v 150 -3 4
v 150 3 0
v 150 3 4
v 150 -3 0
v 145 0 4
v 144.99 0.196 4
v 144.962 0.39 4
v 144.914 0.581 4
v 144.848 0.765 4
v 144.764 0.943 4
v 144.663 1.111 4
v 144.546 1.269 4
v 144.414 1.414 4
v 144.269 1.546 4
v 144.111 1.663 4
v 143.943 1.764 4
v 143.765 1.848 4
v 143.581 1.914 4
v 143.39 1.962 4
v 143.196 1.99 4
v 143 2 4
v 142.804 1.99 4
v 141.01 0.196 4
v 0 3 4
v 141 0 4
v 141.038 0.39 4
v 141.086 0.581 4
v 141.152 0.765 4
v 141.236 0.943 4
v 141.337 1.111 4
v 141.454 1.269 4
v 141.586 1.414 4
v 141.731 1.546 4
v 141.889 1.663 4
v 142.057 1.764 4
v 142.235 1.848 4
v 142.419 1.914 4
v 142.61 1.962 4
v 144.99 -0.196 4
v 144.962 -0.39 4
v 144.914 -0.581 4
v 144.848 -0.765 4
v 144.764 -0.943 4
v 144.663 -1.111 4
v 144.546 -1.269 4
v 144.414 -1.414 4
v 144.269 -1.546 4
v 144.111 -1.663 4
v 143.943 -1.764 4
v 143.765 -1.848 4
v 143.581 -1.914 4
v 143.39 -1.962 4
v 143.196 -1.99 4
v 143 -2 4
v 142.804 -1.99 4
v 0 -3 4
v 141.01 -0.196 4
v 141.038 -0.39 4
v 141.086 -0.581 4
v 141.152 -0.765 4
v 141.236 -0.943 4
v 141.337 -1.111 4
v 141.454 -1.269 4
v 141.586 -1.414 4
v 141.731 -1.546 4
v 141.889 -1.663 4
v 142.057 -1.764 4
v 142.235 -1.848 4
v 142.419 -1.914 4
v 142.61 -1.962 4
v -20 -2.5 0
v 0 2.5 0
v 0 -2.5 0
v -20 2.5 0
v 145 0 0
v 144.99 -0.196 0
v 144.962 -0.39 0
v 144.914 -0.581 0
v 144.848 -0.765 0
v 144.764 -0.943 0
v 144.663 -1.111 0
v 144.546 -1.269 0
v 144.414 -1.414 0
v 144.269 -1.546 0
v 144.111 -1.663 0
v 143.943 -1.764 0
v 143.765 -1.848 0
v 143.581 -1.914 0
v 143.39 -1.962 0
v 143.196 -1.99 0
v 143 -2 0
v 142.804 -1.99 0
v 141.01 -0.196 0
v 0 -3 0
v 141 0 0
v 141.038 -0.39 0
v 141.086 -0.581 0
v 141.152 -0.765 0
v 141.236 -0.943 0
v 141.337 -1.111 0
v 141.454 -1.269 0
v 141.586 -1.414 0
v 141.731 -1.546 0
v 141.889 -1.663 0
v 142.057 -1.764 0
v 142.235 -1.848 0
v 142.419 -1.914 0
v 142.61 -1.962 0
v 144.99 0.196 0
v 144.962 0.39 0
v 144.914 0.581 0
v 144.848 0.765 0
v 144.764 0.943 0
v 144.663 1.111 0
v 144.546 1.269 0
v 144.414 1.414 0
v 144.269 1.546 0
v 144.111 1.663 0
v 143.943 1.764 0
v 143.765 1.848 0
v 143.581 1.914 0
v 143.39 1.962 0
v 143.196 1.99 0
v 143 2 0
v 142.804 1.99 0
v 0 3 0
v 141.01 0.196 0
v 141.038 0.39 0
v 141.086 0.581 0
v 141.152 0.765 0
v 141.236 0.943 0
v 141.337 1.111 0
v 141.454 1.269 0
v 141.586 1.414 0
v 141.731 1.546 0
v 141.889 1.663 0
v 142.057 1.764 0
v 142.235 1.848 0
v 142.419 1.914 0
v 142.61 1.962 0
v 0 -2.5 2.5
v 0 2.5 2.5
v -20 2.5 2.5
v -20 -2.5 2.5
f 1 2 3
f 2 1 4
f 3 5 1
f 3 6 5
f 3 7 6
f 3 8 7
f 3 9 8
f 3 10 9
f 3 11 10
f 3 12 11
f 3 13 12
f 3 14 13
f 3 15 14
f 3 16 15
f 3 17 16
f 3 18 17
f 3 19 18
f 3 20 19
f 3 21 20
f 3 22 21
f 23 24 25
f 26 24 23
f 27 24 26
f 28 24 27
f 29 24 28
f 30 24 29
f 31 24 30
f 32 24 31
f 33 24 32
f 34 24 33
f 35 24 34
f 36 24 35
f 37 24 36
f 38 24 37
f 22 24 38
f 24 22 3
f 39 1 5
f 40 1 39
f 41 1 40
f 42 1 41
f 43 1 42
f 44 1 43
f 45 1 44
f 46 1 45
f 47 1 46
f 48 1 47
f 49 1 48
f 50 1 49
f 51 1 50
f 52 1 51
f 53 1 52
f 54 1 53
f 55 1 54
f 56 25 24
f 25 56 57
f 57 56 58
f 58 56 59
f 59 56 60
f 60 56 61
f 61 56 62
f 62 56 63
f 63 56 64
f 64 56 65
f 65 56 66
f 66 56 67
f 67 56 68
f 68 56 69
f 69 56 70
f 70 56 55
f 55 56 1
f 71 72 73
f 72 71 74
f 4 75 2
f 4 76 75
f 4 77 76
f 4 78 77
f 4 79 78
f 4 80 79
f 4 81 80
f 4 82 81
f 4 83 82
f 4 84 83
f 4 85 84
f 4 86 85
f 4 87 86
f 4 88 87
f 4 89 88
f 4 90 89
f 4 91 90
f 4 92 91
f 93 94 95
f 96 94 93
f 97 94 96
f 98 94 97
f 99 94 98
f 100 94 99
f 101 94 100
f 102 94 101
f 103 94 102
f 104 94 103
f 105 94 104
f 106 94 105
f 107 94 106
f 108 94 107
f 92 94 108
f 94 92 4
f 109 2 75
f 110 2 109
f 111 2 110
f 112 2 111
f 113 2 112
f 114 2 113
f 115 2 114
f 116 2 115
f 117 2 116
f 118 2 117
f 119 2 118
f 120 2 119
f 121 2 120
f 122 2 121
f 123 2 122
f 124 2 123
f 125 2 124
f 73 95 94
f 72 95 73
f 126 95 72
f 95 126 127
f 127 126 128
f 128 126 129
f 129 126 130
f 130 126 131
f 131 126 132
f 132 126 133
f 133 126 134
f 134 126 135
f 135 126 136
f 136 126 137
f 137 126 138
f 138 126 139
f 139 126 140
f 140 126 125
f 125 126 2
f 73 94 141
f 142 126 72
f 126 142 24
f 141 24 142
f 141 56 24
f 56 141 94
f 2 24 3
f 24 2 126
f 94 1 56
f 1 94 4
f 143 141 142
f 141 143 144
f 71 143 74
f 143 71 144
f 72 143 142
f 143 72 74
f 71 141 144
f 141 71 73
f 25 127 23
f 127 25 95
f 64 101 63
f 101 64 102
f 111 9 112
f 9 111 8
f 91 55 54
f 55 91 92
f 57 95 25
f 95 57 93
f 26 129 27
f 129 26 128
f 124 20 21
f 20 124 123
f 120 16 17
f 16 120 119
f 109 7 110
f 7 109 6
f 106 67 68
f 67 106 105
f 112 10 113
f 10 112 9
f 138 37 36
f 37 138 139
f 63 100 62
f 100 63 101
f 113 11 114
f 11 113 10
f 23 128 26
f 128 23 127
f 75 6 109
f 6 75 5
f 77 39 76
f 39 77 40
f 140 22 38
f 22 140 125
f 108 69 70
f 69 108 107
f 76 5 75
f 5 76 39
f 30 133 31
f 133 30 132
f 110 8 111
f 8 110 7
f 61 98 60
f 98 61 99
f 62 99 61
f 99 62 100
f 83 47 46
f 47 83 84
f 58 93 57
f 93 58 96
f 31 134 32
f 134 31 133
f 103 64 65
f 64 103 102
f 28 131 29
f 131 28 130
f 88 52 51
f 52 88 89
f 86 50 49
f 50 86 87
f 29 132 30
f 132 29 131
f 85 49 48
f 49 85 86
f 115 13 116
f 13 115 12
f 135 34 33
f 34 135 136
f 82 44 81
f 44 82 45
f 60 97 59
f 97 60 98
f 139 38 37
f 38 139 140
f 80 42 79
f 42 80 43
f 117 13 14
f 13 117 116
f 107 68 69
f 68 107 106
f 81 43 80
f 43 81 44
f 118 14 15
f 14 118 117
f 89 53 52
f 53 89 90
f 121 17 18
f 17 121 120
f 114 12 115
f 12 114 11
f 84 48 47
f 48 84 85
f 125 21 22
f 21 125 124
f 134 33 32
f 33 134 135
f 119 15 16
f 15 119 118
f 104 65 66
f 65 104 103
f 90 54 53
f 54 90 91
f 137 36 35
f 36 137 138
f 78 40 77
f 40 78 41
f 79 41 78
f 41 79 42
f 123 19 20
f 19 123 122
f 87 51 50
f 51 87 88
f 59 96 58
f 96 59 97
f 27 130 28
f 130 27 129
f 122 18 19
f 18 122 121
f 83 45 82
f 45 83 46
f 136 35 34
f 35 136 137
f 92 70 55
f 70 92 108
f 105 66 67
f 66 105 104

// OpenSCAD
// Built by bench/smallmodels/features/compiler.py from a list of features.
$fn = 64;
difference() {
  union() {
    translate([75, 0, 0]) translate([-75, -3, 0]) cube([150, 6, 4]);
    translate([0, 0, 0]) translate([-20, -2.5, 0]) cube([40, 5, 2.5]);
  }
  union() {
    translate([143, 0, -0.01]) rotate([0, 0, 0]) cylinder(d = 4, h = 4.02);
  }
}
